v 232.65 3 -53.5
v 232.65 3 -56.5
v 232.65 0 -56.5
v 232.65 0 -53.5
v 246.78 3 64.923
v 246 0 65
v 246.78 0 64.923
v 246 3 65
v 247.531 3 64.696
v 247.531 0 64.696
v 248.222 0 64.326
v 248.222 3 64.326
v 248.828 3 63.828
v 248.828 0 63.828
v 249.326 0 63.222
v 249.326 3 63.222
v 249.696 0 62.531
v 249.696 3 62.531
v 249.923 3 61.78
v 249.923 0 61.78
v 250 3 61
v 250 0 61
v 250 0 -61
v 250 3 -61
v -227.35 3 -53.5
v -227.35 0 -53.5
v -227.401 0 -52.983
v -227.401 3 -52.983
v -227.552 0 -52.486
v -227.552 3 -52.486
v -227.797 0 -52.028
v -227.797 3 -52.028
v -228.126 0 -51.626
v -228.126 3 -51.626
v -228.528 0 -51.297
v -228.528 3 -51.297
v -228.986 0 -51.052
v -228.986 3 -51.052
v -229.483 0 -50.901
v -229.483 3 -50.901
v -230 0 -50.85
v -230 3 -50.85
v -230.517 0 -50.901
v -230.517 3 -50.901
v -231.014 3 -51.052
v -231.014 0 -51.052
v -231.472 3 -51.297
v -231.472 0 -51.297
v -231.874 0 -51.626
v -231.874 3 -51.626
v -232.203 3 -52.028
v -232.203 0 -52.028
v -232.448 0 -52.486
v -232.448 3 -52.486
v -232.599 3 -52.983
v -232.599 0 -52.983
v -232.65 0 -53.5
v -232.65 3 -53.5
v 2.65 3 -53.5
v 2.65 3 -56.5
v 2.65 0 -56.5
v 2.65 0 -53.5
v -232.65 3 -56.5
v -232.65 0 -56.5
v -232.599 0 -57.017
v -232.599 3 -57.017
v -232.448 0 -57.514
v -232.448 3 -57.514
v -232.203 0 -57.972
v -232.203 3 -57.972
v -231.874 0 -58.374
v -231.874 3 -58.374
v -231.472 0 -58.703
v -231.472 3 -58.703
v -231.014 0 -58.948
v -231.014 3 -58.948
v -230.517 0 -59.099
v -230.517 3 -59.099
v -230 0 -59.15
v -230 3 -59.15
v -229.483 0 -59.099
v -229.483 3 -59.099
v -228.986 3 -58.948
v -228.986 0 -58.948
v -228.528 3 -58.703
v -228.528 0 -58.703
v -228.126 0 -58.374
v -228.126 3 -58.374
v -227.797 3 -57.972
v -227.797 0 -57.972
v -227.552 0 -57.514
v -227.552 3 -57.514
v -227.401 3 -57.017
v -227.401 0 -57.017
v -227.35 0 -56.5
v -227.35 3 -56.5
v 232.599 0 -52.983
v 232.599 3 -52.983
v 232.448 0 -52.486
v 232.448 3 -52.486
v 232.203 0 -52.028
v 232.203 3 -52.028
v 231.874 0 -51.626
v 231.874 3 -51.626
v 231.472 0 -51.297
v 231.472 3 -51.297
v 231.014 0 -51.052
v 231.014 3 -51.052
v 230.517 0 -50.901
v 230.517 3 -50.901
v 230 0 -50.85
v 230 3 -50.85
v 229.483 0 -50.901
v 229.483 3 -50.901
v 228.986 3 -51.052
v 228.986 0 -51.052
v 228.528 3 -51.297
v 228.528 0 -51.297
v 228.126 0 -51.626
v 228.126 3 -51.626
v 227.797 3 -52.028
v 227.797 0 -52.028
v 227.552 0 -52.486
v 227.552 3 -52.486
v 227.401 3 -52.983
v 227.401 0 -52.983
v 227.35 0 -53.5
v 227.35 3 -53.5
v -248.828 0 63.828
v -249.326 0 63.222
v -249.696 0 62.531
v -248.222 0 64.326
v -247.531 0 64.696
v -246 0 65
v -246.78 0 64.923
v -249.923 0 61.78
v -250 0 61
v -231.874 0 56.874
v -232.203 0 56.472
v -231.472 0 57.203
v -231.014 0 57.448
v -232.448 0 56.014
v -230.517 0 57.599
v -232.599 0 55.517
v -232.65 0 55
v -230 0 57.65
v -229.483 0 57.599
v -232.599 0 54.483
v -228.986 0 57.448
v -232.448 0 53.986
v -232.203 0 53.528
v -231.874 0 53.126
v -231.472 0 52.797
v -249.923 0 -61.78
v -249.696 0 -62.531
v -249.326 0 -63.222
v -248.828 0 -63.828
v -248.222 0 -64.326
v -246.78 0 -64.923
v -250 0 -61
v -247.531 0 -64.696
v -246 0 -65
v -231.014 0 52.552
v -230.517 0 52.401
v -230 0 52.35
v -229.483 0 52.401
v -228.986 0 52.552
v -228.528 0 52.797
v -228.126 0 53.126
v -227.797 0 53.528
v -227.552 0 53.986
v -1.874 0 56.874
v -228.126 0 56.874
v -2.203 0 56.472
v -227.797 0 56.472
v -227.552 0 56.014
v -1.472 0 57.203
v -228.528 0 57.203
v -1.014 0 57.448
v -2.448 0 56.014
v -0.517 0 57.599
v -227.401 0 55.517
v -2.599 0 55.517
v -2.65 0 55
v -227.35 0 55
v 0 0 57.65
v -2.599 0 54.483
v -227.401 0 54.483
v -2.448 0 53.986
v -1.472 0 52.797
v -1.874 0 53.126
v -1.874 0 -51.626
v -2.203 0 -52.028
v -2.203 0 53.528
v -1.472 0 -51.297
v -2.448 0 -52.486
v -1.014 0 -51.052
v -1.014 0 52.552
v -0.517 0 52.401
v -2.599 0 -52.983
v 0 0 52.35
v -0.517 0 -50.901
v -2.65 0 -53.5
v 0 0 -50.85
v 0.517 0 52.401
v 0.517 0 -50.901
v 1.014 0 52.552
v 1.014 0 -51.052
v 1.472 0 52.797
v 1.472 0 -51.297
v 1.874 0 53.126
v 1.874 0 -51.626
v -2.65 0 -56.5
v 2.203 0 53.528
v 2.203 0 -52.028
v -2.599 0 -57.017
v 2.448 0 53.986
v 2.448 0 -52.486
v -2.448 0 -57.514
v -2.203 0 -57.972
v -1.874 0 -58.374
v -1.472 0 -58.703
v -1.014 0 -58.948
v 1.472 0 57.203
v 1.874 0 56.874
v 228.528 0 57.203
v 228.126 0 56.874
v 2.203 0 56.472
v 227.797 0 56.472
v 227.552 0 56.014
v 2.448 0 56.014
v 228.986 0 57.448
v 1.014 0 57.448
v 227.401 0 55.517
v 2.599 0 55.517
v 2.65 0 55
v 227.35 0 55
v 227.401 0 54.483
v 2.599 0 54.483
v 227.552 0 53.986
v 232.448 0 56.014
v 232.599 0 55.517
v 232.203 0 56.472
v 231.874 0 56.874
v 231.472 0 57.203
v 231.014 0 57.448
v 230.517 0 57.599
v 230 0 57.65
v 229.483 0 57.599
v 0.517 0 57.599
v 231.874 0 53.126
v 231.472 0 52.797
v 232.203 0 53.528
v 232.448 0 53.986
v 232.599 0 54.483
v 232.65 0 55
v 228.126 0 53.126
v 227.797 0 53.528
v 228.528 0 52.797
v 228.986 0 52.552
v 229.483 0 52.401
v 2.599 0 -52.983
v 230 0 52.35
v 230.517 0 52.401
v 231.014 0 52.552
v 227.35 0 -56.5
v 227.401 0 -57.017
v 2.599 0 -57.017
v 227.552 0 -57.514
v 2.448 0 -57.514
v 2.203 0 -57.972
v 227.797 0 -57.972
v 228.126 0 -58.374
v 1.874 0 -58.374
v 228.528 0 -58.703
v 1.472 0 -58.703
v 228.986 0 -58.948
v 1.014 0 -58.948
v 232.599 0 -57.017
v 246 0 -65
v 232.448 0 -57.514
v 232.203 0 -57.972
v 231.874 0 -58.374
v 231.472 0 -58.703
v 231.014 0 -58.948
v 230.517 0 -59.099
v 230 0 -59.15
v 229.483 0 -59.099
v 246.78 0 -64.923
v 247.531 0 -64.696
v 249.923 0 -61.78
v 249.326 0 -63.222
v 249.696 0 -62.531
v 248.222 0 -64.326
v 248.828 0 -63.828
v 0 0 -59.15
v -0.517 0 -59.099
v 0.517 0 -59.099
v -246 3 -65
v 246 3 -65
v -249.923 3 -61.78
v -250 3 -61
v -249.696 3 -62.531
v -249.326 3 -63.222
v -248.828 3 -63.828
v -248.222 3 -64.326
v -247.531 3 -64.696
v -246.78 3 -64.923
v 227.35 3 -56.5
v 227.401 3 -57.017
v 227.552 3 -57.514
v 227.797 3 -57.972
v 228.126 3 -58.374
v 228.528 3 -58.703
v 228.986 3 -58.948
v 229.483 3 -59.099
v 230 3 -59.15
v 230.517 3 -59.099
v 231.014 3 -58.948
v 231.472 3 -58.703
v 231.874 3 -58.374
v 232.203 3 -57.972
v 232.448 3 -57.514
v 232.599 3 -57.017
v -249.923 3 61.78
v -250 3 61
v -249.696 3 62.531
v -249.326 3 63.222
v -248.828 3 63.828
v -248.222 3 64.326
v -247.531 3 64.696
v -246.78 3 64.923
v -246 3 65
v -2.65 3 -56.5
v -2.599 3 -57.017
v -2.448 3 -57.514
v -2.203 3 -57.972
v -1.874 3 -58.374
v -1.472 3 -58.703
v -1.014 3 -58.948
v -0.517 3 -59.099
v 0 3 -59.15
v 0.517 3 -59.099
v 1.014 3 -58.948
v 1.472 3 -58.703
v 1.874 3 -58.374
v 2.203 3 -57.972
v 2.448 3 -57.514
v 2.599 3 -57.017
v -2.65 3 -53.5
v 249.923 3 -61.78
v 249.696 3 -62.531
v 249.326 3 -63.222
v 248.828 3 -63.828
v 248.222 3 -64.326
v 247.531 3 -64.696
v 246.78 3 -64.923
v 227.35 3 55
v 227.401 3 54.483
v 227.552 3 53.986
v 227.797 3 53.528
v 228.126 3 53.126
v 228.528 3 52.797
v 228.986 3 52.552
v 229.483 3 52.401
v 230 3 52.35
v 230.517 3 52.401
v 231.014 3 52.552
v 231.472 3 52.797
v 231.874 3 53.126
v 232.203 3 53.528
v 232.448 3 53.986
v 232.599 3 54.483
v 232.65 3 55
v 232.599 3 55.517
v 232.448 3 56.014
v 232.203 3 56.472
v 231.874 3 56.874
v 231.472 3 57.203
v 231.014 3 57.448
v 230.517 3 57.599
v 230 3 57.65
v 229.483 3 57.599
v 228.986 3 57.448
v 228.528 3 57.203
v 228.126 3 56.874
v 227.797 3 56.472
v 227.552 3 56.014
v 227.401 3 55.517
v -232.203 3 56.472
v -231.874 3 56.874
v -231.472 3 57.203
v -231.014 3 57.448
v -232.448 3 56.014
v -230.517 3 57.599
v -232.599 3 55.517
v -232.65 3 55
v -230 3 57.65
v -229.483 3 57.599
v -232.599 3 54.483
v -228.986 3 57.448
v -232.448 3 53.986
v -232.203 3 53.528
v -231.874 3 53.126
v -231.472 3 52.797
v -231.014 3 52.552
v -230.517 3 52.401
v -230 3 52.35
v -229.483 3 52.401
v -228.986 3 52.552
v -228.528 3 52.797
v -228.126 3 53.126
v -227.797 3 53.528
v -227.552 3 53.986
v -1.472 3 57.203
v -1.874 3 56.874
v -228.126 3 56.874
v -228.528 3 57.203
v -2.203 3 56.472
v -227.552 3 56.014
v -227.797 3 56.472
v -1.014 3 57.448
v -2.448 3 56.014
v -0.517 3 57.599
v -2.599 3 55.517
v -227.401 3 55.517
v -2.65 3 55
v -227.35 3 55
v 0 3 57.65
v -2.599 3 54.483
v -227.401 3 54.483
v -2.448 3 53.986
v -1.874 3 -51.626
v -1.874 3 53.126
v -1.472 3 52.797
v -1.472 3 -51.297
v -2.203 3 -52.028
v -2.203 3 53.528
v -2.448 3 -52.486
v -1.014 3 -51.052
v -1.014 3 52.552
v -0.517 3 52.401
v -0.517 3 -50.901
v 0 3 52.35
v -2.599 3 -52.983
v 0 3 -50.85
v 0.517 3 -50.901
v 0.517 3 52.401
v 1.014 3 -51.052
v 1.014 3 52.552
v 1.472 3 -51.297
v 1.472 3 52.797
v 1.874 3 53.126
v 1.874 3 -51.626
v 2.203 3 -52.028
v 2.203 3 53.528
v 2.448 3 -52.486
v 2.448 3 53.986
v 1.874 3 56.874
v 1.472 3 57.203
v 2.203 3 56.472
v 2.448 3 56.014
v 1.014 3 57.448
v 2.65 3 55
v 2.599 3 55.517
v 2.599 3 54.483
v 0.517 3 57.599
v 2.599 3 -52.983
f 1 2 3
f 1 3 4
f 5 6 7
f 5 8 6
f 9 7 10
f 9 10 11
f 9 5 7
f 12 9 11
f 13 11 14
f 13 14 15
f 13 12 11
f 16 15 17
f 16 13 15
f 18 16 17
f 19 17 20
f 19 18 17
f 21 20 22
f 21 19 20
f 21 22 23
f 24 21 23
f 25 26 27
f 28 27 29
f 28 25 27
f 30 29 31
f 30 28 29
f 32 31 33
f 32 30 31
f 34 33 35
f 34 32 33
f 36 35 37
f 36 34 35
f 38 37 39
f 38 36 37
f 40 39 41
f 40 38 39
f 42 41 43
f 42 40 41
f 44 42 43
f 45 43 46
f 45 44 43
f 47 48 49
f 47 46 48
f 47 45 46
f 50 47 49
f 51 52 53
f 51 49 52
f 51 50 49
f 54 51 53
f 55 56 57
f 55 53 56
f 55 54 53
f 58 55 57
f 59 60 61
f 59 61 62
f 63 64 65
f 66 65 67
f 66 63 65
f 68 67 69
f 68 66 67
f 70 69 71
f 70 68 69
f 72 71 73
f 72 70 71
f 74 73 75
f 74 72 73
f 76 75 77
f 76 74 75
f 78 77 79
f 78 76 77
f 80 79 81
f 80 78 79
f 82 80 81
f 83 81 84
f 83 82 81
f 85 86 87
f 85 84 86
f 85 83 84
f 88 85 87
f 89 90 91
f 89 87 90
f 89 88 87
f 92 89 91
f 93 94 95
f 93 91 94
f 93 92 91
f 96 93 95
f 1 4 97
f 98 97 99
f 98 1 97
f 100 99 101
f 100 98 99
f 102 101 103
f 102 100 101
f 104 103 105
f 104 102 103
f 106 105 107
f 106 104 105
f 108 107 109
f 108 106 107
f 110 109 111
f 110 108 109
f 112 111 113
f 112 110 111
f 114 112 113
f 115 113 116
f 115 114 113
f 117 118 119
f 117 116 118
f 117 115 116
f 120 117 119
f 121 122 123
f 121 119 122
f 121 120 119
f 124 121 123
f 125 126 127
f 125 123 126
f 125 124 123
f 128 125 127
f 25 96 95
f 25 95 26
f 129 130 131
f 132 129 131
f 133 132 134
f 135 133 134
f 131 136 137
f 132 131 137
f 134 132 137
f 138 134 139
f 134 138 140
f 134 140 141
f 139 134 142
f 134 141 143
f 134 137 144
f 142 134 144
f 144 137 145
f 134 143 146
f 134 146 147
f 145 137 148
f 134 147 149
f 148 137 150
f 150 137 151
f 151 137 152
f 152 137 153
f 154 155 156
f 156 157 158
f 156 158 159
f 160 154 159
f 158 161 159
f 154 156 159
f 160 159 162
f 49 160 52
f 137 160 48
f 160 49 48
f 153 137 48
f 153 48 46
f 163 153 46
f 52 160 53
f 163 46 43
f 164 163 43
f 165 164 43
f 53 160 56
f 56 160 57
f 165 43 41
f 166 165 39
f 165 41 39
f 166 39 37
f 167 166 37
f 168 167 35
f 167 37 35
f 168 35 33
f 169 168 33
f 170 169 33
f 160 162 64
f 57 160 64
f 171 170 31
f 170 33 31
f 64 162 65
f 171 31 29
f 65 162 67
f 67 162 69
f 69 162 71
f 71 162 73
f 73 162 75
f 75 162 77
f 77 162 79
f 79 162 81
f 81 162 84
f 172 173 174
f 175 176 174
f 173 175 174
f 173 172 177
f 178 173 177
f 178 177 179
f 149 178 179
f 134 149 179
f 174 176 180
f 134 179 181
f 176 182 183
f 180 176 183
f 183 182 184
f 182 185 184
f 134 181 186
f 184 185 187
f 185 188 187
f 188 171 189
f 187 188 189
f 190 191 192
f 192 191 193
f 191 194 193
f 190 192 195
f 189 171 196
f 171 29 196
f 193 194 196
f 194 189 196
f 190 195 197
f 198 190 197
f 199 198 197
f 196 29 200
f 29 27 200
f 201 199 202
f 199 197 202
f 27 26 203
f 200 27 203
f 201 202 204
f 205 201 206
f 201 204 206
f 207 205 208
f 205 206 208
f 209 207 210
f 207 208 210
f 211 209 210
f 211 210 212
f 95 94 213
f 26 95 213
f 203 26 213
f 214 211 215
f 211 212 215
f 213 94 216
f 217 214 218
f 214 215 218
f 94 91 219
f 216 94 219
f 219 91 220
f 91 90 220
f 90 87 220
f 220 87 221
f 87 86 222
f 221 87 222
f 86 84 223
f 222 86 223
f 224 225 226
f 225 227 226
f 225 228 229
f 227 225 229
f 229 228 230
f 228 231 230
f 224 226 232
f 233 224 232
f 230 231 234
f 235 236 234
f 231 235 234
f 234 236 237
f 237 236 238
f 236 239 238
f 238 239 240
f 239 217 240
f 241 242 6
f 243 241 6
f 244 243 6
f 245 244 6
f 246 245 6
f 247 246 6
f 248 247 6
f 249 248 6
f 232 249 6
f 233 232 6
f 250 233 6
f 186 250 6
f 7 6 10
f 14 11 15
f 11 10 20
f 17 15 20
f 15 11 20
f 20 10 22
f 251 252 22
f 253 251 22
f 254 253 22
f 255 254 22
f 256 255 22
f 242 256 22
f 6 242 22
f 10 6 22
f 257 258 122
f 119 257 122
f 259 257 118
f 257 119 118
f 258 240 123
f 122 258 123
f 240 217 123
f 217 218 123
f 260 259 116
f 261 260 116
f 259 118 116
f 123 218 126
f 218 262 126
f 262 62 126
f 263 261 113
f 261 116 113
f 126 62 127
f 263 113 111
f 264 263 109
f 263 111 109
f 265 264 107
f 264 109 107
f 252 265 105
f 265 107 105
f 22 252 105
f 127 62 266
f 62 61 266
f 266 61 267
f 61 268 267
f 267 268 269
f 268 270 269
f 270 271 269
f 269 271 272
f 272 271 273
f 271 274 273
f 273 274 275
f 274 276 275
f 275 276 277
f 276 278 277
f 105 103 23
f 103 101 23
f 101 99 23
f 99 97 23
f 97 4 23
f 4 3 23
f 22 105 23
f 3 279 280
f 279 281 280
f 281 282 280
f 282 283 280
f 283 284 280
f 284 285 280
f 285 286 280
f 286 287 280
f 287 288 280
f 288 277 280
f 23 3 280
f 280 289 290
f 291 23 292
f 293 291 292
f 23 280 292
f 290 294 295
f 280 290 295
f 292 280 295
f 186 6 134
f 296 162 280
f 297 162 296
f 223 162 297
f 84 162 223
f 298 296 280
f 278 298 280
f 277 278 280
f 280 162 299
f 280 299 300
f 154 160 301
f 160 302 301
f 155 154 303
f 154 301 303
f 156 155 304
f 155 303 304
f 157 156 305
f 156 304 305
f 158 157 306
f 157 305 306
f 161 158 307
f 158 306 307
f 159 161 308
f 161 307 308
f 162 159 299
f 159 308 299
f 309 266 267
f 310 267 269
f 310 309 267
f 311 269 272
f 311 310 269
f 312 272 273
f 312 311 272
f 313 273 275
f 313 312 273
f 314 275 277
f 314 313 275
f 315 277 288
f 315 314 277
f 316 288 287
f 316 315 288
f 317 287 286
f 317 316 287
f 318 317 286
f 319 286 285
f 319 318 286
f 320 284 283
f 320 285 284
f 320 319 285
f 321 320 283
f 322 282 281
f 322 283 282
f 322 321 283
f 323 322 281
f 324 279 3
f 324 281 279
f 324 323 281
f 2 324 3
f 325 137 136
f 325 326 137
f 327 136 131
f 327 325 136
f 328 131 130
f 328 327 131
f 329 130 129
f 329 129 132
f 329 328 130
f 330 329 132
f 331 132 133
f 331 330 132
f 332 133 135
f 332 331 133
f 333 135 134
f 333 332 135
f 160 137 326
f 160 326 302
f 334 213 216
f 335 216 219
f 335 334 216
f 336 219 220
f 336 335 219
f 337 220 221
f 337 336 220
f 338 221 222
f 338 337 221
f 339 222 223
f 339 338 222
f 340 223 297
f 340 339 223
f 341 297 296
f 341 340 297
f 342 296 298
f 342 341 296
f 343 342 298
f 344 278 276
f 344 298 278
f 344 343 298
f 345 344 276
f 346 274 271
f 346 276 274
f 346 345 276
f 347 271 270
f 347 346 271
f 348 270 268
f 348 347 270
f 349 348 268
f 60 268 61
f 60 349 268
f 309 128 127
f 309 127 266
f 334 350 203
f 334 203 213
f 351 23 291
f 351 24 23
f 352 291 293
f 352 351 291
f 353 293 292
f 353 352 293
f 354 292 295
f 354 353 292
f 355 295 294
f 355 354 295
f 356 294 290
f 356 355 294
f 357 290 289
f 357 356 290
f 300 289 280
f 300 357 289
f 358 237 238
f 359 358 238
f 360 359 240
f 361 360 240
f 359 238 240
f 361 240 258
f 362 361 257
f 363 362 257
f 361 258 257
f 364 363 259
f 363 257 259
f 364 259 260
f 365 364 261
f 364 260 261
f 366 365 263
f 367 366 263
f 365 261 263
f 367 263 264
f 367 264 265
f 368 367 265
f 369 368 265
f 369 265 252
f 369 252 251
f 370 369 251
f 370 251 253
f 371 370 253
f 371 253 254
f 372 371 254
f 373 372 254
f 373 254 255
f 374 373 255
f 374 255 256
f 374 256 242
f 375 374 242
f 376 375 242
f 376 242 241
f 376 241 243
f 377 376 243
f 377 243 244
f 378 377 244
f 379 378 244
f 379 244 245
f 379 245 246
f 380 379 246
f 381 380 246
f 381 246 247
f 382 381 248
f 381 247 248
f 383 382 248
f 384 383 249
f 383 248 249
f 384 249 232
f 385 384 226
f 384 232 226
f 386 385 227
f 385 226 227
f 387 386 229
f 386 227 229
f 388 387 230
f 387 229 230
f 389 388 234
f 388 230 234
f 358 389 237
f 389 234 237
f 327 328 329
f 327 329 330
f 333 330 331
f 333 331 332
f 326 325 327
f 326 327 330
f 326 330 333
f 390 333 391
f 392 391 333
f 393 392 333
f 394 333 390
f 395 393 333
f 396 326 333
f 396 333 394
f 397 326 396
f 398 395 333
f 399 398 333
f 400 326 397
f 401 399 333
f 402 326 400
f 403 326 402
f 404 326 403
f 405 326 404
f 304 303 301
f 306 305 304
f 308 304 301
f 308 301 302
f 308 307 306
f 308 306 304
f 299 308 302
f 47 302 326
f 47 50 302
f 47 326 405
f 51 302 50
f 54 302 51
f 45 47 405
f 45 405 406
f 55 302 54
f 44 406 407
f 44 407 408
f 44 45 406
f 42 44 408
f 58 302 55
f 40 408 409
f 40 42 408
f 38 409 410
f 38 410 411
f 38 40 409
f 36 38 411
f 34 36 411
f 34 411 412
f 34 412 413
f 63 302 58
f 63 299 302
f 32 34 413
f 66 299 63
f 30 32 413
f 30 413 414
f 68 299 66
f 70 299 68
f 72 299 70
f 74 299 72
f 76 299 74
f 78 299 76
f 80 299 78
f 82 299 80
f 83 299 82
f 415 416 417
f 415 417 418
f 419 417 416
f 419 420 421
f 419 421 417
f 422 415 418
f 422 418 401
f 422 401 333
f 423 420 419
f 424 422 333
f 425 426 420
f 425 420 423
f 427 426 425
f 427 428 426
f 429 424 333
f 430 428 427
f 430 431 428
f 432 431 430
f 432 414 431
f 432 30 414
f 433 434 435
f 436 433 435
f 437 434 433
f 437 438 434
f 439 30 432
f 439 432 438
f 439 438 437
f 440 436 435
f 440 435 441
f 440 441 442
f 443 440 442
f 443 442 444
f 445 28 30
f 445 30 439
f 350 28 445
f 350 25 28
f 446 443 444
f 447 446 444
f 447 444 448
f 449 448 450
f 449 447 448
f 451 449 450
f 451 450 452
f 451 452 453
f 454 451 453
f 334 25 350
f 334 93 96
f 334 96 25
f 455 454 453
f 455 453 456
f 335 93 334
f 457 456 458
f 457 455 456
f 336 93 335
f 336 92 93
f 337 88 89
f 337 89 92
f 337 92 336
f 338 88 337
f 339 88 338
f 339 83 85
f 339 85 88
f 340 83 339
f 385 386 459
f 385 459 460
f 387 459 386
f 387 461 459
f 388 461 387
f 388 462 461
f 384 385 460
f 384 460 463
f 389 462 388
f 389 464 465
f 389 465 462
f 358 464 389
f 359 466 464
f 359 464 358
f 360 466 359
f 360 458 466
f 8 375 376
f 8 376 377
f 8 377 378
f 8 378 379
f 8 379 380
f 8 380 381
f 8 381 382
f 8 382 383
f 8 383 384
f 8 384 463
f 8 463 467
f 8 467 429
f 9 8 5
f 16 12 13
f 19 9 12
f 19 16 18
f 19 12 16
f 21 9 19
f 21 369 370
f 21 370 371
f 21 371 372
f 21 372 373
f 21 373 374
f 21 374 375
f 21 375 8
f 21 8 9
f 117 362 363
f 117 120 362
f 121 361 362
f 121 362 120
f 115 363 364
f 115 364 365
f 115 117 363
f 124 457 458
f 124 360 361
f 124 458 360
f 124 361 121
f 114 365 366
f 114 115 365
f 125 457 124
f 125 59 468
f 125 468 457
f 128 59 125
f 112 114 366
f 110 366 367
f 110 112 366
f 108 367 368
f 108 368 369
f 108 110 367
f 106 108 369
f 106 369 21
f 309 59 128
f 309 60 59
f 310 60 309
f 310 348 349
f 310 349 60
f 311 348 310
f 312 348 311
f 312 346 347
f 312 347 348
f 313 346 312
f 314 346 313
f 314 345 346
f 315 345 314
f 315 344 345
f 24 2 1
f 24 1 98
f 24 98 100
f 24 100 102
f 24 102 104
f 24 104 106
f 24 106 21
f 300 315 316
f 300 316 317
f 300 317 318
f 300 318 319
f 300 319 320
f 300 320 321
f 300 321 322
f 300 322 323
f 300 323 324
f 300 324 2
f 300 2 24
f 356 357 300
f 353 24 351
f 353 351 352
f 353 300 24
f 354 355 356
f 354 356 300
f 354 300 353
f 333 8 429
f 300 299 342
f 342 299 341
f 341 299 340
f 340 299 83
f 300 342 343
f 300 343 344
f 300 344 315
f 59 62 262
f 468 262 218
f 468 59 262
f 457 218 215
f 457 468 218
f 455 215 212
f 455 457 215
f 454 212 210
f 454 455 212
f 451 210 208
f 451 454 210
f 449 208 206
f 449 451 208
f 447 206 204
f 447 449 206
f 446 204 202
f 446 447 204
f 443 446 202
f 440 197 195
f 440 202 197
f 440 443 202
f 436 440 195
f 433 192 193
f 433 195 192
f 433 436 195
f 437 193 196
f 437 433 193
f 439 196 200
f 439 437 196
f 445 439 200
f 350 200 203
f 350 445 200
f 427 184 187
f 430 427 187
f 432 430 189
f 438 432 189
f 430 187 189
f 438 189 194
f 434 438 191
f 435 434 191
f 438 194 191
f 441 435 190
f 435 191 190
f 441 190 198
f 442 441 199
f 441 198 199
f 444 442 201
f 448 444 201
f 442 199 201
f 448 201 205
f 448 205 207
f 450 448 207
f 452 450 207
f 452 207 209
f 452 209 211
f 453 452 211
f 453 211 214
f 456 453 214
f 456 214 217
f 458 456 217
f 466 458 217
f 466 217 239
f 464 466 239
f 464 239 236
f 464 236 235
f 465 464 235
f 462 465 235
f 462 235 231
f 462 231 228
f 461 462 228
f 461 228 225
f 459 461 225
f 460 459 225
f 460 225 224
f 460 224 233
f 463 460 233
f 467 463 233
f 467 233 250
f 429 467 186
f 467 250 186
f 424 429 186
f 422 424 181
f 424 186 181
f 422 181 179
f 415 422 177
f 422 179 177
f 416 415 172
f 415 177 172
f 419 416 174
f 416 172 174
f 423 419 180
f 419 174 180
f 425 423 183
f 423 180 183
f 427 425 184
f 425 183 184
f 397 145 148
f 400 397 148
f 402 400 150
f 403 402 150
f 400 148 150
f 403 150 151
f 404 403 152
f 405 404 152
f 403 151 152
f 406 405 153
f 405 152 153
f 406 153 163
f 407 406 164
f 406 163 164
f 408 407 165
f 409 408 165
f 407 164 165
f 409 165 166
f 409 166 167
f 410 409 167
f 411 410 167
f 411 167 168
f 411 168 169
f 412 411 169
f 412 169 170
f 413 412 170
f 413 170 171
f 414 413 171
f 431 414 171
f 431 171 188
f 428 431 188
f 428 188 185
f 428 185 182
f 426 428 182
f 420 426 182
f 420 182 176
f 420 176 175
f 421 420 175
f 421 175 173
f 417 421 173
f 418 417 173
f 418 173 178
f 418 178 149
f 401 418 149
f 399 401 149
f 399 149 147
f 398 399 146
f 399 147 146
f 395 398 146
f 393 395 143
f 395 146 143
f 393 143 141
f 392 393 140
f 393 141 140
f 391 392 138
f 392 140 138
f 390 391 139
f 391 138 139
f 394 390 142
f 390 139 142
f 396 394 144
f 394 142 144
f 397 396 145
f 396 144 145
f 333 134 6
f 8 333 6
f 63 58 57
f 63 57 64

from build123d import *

# Parameters (mm, degrees)
SKETCH1_W                  = 500
SKETCH1_H                  = 130
BOSS_EXTRUDE1_DEPTH        = 3
FILLET1_R                  = 4
F_5_3_5_3_DIAMETER_HOLE1_D = 5.3
CUT_EXTRUDE1_DEPTH         = 4


with BuildPart() as part:
    # Sketch1 → Boss-Extrude1 (new body)
    with BuildSketch(Plane(origin=(0, 0, 0), x_dir=(1, 0, 0), z_dir=(0, 1, 0))):
        Rectangle(SKETCH1_W, SKETCH1_H)
    extrude(amount=BOSS_EXTRUDE1_DEPTH)

    # Fillet1
    fillet1_edges = [part.edges().sort_by_distance(p)[0] for p in [
        (250, 1.5, 65),
        (-250, 1.5, 65),
        (-250, 1.5, -65),
        (250, 1.5, -65),
    ]]
    fillet(fillet1_edges, radius=FILLET1_R)

    # Ø5.3 (5.3) Diameter Hole1 (through all)
    with Locations(Plane(origin=(0, 3, 0), x_dir=(1, 0, 0), z_dir=(0, 1, 0))):
        with Locations((230, 55), (-230, -55), (-230, 55), (230, -55), (0, 55), (0, -55)):
            Hole(F_5_3_5_3_DIAMETER_HOLE1_D / 2)

    # Sketch6 → Cut-Extrude1 (cut, through all)
    with BuildSketch(Plane(origin=(0, 3, 0), x_dir=(1, 0, 0), z_dir=(0, 1, 0))):
        with BuildLine():
            Line((-232.65, 53.5), (-232.65, 56.5))
            ThreePointArc((-232.65, 56.5), (-230, 59.15), (-227.35, 56.5))
            Line((-227.35, 56.5), (-227.35, 53.5))
            ThreePointArc((-227.35, 53.5), (-230, 50.85), (-232.65, 53.5))
        make_face()
        with BuildLine():
            Line((-2.65, 53.5), (-2.65, 56.5))
            ThreePointArc((-2.65, 56.5), (0, 59.15), (2.65, 56.5))
            Line((2.65, 56.5), (2.65, 53.5))
            ThreePointArc((2.65, 53.5), (0, 50.85), (-2.65, 53.5))
        make_face()
        with BuildLine():
            Line((227.35, 53.5), (227.35, 56.5))
            ThreePointArc((227.35, 56.5), (230, 59.15), (232.65, 56.5))
            Line((232.65, 56.5), (232.65, 53.5))
            ThreePointArc((232.65, 53.5), (230, 50.85), (227.35, 53.5))
        make_face()
    extrude(amount=-CUT_EXTRUDE1_DEPTH, mode=Mode.SUBTRACT)


solid = part.part
